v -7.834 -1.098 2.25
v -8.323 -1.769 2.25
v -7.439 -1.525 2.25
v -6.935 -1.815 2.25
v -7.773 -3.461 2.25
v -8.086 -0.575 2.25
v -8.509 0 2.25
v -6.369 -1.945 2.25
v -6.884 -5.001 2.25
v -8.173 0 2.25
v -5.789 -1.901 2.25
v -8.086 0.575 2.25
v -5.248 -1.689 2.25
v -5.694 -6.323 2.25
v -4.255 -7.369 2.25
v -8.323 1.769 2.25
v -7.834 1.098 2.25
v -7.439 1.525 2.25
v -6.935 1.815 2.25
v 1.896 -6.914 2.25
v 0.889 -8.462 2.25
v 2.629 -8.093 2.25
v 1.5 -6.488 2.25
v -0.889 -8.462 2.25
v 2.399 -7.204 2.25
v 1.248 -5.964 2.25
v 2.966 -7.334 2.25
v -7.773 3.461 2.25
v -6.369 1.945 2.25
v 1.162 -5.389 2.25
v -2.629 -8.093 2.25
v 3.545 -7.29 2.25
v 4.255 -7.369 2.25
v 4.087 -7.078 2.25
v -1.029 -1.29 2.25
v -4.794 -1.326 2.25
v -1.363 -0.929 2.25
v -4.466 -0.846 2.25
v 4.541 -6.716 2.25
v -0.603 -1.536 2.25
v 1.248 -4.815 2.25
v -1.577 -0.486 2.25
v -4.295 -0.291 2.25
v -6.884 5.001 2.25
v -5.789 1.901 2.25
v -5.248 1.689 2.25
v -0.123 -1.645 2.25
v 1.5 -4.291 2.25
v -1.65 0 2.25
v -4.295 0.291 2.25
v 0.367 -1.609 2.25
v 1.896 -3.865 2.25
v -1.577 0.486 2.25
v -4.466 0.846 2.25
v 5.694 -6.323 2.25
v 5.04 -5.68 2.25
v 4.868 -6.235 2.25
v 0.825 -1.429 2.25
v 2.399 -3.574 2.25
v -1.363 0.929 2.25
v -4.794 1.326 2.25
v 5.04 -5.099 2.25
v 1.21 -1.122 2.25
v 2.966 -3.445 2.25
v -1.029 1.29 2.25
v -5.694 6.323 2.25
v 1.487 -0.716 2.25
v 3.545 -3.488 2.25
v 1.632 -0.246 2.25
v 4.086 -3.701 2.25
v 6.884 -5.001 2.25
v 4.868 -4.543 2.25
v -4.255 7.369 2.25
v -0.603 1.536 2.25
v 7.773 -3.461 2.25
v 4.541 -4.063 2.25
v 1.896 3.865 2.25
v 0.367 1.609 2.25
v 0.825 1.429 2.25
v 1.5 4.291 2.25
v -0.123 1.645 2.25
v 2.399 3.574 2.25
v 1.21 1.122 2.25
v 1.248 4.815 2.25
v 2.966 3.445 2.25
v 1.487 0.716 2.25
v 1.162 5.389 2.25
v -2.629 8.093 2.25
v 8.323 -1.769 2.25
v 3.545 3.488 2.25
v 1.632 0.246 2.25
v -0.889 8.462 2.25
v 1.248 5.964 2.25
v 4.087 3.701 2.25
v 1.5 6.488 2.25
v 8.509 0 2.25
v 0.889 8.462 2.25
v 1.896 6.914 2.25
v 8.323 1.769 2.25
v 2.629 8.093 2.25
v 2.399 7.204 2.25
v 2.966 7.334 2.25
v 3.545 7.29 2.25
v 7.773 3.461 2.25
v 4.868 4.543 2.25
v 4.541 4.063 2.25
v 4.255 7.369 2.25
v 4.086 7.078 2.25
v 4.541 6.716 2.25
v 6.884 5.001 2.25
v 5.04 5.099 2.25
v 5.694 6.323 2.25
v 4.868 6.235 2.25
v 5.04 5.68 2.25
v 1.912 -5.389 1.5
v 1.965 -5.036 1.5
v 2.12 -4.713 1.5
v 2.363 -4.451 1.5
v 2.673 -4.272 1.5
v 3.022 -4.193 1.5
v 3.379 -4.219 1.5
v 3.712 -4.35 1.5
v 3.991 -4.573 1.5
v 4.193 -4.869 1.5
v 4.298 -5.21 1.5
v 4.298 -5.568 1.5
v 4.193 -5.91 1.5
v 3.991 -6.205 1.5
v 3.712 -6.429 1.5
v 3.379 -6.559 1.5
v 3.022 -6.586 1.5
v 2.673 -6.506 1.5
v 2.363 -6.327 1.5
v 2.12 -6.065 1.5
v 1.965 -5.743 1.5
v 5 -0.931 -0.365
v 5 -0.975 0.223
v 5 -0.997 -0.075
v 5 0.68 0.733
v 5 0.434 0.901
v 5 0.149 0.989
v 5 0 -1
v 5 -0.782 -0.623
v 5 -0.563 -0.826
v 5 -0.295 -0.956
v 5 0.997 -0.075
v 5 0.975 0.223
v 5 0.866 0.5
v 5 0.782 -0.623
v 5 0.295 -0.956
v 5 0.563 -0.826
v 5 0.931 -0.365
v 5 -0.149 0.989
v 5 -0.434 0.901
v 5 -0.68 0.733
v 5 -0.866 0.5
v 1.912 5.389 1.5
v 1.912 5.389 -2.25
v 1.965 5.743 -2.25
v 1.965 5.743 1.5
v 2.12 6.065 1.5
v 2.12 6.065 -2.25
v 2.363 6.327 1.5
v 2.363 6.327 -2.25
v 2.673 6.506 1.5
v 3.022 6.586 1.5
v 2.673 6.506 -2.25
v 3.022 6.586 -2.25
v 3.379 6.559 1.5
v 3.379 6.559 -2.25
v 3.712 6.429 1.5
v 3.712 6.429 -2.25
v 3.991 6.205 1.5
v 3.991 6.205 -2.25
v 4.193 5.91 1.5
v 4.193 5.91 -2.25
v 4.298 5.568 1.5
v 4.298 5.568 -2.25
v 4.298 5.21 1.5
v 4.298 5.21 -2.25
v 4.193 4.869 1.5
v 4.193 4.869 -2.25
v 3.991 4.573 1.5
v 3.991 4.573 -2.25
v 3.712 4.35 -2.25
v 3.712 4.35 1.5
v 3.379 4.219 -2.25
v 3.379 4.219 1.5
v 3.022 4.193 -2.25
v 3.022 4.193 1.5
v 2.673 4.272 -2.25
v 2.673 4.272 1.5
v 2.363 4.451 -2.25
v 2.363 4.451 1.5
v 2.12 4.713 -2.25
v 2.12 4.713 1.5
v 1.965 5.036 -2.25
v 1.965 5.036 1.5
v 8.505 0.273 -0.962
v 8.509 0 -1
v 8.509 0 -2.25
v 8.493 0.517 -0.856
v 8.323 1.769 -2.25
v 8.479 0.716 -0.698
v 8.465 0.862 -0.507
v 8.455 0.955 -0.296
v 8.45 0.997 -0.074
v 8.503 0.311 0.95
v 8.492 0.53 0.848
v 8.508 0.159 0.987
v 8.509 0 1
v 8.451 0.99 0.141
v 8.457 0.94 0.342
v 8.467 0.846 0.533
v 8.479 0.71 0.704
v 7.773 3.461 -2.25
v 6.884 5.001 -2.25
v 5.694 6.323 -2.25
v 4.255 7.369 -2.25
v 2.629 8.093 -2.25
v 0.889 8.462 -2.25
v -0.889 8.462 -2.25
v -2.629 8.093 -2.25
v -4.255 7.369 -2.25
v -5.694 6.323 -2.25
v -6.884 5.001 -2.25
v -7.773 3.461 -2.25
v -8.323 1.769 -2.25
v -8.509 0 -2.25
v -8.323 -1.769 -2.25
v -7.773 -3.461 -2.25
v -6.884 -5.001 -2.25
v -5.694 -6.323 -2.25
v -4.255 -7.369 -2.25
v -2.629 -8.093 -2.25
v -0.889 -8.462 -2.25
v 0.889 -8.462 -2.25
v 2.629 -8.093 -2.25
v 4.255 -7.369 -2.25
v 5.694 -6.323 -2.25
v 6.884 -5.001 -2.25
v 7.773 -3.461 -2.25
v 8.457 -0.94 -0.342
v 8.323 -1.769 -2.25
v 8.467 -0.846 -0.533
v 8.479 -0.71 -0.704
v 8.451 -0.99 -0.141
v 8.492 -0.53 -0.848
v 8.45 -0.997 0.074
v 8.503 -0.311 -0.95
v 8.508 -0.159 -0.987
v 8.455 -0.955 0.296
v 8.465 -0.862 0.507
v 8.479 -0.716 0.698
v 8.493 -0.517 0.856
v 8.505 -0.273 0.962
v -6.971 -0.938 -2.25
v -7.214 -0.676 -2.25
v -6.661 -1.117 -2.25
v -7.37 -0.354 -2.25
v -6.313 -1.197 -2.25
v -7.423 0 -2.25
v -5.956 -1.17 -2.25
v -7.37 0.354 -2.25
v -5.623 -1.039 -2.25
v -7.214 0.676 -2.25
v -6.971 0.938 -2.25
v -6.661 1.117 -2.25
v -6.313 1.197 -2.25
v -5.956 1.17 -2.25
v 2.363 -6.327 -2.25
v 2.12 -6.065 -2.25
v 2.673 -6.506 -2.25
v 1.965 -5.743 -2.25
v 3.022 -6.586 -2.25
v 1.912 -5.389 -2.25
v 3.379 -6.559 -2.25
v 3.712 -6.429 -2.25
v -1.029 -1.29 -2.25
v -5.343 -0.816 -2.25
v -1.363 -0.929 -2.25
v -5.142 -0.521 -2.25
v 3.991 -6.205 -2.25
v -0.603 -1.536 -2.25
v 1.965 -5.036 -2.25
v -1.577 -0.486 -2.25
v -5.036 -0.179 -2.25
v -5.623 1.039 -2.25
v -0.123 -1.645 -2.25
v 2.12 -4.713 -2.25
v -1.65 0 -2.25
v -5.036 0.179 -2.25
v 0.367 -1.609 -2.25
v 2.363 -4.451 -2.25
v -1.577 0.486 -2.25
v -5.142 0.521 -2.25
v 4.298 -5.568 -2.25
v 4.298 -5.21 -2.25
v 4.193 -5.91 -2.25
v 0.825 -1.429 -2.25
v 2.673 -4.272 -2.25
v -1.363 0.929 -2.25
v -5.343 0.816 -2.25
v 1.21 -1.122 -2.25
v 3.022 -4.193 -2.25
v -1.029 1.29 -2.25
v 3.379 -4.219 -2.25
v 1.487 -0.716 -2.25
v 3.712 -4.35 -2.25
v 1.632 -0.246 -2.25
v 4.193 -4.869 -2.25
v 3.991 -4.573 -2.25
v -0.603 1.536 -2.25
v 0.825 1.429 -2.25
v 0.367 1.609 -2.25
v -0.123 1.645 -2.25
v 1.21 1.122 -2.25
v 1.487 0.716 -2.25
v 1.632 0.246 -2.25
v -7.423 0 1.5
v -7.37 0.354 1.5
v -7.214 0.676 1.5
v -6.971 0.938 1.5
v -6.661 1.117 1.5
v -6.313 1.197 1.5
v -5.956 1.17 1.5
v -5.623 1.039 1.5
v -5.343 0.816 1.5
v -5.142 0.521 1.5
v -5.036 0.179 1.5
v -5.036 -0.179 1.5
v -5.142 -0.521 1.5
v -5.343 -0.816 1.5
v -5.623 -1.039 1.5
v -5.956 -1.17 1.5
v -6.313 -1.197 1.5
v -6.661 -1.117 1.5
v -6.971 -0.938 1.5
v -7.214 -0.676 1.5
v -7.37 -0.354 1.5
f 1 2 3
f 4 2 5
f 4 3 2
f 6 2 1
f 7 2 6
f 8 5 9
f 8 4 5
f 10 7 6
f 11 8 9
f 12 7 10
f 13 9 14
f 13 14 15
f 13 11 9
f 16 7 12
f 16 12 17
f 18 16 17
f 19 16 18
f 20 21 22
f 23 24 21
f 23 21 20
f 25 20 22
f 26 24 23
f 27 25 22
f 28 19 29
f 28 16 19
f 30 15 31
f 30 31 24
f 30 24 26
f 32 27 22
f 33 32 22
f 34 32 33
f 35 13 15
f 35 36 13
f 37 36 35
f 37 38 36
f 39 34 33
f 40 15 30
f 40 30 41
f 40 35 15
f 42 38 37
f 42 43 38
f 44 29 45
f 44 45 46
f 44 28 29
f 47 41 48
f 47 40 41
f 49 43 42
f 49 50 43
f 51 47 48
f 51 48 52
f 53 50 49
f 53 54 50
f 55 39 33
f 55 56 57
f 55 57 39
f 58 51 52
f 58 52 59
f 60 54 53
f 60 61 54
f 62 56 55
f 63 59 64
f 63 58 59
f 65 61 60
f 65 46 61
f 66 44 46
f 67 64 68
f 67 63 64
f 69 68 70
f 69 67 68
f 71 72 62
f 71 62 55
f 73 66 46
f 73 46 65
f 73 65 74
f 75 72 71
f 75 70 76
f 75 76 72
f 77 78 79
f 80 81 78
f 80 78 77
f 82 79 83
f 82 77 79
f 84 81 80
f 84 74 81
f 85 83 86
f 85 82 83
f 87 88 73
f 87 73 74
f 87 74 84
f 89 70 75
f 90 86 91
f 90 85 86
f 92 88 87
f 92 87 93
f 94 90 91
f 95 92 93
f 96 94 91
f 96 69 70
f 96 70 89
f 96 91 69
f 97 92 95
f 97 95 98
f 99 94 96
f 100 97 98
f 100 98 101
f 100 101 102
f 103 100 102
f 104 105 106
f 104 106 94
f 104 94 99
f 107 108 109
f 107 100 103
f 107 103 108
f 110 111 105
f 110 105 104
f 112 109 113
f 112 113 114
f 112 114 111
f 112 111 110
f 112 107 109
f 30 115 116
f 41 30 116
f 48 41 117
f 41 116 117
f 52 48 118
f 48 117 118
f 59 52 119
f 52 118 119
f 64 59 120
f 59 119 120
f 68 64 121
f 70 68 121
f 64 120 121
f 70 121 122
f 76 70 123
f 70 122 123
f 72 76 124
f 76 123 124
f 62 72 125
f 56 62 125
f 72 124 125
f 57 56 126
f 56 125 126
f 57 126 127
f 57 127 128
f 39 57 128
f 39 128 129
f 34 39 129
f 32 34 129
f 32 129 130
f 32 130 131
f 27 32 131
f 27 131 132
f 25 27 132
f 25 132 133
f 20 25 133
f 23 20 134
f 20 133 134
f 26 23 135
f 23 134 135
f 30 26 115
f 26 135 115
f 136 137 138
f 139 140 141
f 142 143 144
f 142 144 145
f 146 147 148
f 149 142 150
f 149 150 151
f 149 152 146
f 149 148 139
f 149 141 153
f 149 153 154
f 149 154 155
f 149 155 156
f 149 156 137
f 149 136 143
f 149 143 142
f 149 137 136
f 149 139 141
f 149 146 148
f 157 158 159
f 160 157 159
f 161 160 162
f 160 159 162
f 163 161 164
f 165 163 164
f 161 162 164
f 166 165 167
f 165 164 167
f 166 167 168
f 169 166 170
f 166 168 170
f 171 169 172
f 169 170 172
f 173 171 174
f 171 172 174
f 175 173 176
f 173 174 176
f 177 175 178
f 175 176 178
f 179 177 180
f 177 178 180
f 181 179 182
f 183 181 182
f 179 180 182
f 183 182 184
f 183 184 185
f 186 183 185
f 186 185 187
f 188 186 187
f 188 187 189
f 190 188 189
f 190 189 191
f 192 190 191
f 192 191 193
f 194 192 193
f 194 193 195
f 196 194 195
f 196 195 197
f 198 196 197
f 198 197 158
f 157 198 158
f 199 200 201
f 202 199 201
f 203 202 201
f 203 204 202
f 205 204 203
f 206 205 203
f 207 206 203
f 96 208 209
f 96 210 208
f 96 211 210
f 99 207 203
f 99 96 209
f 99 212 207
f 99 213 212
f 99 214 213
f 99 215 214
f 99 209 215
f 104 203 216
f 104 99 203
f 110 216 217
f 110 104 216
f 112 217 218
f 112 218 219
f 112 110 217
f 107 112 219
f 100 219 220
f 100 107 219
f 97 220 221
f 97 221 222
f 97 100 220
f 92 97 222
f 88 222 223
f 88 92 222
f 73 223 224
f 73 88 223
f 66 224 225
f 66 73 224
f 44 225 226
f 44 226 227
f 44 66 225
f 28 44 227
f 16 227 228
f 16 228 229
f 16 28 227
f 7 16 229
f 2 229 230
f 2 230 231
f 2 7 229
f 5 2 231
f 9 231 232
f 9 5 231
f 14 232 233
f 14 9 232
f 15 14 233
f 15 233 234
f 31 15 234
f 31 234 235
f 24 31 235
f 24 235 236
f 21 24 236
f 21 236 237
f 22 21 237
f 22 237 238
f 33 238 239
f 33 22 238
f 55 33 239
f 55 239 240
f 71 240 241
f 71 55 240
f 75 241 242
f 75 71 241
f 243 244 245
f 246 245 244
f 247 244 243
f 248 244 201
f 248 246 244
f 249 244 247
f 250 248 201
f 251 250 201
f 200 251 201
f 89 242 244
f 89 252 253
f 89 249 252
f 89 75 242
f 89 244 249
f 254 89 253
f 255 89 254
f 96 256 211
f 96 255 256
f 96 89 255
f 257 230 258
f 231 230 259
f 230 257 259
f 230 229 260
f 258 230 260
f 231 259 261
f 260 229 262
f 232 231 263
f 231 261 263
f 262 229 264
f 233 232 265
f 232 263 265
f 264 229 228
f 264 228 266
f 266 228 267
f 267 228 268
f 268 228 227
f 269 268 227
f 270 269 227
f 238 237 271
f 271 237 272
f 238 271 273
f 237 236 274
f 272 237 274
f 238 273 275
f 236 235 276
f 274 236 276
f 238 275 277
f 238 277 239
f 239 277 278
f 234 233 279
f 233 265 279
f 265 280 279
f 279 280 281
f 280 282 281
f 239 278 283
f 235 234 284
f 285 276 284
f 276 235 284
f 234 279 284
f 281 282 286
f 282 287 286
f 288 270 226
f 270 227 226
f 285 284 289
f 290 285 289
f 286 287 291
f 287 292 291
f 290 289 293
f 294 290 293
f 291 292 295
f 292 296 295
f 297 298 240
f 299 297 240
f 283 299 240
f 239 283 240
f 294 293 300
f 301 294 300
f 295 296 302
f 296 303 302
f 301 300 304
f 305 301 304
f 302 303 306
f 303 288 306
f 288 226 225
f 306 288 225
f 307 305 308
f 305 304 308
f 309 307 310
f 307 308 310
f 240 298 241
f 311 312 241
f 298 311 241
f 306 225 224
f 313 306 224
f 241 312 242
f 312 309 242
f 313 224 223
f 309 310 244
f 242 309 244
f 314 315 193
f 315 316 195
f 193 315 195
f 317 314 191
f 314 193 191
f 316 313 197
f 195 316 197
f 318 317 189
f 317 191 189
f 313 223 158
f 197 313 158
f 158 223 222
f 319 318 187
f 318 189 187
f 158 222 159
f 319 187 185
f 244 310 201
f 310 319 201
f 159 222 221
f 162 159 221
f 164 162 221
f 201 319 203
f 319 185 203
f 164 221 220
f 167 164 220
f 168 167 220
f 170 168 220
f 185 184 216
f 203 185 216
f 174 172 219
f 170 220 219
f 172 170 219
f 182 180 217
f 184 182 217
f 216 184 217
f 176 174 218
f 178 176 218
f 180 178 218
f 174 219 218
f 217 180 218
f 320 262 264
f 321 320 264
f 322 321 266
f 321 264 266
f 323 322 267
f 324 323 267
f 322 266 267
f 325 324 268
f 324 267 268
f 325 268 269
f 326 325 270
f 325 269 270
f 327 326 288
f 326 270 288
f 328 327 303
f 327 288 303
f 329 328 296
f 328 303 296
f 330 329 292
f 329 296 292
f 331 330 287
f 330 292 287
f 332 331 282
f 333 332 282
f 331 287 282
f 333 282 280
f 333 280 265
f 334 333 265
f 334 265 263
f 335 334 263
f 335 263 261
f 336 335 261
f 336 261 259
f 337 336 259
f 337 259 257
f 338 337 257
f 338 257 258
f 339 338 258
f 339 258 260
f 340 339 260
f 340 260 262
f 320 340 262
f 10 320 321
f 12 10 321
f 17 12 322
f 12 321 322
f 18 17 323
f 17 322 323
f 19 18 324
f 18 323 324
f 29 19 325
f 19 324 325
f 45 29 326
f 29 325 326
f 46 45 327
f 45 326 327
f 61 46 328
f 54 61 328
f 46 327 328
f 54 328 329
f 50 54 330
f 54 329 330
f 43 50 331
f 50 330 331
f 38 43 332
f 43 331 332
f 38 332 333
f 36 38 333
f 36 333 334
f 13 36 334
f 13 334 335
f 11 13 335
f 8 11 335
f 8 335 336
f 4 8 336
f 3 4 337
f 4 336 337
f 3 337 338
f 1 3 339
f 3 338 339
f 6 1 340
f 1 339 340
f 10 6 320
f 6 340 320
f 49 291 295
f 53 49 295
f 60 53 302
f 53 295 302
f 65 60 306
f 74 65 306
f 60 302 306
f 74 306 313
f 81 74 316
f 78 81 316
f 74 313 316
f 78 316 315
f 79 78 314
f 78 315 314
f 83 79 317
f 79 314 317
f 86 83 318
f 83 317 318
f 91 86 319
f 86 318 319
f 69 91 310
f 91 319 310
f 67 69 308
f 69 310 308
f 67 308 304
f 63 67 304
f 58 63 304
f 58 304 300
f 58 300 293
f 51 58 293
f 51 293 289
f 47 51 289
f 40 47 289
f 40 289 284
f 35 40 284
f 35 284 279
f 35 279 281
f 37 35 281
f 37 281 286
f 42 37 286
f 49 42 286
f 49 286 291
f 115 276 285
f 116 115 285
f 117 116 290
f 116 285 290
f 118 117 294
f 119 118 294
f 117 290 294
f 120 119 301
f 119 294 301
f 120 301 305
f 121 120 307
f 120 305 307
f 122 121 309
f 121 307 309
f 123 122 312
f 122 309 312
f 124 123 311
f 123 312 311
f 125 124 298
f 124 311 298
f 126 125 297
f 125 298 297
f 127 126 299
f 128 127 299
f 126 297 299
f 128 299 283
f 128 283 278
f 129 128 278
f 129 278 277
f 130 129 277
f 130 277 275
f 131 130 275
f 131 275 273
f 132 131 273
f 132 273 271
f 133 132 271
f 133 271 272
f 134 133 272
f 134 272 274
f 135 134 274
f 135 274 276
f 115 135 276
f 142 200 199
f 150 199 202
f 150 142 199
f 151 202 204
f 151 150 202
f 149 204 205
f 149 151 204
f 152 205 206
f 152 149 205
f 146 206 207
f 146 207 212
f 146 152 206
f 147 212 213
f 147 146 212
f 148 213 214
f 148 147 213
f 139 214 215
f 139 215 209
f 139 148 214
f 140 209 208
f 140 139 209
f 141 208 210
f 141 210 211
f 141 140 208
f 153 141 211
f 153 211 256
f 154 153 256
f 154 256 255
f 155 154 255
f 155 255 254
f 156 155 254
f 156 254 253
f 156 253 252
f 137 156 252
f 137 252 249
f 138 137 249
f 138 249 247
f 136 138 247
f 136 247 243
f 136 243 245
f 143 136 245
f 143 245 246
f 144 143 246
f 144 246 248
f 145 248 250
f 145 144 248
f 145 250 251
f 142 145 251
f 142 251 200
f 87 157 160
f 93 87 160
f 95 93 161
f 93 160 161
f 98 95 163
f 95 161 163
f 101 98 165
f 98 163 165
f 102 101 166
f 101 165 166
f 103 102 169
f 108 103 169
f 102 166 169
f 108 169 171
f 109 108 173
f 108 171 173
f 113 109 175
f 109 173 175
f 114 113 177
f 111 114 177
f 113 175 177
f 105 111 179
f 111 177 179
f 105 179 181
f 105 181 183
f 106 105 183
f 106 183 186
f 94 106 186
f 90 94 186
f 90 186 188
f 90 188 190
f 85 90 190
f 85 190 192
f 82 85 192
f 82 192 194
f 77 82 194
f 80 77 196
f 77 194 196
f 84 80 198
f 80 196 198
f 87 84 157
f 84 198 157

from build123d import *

# Parameters (mm, degrees)
SKETCH2_R             = 8.509
BOSS_EXTRUDE1_DEPTH   = 2.25
M2_CLEARANCE_HOLE1_D  = 2.4
CHAMFER1_SIZE         = 0.75
CHAMFER2_SIZE         = 0.75
CHAMFER3_SIZE         = 0.75
M4X0_7_TAPPED_HOLE1_D = 3.3
SKETCH11_R            = 1
CUT_EXTRUDE1_DEPTH    = 4.509


with BuildPart() as part:
    # Sketch2 → Boss-Extrude1 (new body, symmetric)
    with BuildSketch(Plane.XY):
        Circle(SKETCH2_R)
    extrude(amount=BOSS_EXTRUDE1_DEPTH, both=True)

    # M2 Clearance Hole1 (through all)
    with Locations(Plane.XY.offset(2.25)):
        with Locations((-6.223, 0), (3.1115, 5.389276088), (3.1115, -5.389276088)):
            Hole(M2_CLEARANCE_HOLE1_D / 2)

    # Chamfer1
    chamfer1_edges = [part.edges().sort_by_distance(p)[0] for p in [
        (4.3115, -5.389276088, 2.25),
    ]]
    chamfer(chamfer1_edges, length=CHAMFER1_SIZE)

    # Chamfer2
    chamfer2_edges = [part.edges().sort_by_distance(p)[0] for p in [
        (4.3115, 5.389276088, 2.25),
    ]]
    chamfer(chamfer2_edges, length=CHAMFER2_SIZE)

    # Chamfer3
    chamfer3_edges = [part.edges().sort_by_distance(p)[0] for p in [
        (-5.023, 0, 2.25),
    ]]
    chamfer(chamfer3_edges, length=CHAMFER3_SIZE)

    # M4x0.7 Tapped Hole1 (through all)
    with Locations(Plane.XY.offset(2.25)):
        with Locations((0, 0)):
            Hole(M4X0_7_TAPPED_HOLE1_D / 2)

    # Sketch11 → Cut-Extrude1 (cut, through all)
    with BuildSketch(Plane(origin=(5, 0, 0), x_dir=(0, 0, -1), z_dir=(1, 0, 0))):
        Circle(SKETCH11_R)
    extrude(amount=CUT_EXTRUDE1_DEPTH, mode=Mode.SUBTRACT)


solid = part.part
